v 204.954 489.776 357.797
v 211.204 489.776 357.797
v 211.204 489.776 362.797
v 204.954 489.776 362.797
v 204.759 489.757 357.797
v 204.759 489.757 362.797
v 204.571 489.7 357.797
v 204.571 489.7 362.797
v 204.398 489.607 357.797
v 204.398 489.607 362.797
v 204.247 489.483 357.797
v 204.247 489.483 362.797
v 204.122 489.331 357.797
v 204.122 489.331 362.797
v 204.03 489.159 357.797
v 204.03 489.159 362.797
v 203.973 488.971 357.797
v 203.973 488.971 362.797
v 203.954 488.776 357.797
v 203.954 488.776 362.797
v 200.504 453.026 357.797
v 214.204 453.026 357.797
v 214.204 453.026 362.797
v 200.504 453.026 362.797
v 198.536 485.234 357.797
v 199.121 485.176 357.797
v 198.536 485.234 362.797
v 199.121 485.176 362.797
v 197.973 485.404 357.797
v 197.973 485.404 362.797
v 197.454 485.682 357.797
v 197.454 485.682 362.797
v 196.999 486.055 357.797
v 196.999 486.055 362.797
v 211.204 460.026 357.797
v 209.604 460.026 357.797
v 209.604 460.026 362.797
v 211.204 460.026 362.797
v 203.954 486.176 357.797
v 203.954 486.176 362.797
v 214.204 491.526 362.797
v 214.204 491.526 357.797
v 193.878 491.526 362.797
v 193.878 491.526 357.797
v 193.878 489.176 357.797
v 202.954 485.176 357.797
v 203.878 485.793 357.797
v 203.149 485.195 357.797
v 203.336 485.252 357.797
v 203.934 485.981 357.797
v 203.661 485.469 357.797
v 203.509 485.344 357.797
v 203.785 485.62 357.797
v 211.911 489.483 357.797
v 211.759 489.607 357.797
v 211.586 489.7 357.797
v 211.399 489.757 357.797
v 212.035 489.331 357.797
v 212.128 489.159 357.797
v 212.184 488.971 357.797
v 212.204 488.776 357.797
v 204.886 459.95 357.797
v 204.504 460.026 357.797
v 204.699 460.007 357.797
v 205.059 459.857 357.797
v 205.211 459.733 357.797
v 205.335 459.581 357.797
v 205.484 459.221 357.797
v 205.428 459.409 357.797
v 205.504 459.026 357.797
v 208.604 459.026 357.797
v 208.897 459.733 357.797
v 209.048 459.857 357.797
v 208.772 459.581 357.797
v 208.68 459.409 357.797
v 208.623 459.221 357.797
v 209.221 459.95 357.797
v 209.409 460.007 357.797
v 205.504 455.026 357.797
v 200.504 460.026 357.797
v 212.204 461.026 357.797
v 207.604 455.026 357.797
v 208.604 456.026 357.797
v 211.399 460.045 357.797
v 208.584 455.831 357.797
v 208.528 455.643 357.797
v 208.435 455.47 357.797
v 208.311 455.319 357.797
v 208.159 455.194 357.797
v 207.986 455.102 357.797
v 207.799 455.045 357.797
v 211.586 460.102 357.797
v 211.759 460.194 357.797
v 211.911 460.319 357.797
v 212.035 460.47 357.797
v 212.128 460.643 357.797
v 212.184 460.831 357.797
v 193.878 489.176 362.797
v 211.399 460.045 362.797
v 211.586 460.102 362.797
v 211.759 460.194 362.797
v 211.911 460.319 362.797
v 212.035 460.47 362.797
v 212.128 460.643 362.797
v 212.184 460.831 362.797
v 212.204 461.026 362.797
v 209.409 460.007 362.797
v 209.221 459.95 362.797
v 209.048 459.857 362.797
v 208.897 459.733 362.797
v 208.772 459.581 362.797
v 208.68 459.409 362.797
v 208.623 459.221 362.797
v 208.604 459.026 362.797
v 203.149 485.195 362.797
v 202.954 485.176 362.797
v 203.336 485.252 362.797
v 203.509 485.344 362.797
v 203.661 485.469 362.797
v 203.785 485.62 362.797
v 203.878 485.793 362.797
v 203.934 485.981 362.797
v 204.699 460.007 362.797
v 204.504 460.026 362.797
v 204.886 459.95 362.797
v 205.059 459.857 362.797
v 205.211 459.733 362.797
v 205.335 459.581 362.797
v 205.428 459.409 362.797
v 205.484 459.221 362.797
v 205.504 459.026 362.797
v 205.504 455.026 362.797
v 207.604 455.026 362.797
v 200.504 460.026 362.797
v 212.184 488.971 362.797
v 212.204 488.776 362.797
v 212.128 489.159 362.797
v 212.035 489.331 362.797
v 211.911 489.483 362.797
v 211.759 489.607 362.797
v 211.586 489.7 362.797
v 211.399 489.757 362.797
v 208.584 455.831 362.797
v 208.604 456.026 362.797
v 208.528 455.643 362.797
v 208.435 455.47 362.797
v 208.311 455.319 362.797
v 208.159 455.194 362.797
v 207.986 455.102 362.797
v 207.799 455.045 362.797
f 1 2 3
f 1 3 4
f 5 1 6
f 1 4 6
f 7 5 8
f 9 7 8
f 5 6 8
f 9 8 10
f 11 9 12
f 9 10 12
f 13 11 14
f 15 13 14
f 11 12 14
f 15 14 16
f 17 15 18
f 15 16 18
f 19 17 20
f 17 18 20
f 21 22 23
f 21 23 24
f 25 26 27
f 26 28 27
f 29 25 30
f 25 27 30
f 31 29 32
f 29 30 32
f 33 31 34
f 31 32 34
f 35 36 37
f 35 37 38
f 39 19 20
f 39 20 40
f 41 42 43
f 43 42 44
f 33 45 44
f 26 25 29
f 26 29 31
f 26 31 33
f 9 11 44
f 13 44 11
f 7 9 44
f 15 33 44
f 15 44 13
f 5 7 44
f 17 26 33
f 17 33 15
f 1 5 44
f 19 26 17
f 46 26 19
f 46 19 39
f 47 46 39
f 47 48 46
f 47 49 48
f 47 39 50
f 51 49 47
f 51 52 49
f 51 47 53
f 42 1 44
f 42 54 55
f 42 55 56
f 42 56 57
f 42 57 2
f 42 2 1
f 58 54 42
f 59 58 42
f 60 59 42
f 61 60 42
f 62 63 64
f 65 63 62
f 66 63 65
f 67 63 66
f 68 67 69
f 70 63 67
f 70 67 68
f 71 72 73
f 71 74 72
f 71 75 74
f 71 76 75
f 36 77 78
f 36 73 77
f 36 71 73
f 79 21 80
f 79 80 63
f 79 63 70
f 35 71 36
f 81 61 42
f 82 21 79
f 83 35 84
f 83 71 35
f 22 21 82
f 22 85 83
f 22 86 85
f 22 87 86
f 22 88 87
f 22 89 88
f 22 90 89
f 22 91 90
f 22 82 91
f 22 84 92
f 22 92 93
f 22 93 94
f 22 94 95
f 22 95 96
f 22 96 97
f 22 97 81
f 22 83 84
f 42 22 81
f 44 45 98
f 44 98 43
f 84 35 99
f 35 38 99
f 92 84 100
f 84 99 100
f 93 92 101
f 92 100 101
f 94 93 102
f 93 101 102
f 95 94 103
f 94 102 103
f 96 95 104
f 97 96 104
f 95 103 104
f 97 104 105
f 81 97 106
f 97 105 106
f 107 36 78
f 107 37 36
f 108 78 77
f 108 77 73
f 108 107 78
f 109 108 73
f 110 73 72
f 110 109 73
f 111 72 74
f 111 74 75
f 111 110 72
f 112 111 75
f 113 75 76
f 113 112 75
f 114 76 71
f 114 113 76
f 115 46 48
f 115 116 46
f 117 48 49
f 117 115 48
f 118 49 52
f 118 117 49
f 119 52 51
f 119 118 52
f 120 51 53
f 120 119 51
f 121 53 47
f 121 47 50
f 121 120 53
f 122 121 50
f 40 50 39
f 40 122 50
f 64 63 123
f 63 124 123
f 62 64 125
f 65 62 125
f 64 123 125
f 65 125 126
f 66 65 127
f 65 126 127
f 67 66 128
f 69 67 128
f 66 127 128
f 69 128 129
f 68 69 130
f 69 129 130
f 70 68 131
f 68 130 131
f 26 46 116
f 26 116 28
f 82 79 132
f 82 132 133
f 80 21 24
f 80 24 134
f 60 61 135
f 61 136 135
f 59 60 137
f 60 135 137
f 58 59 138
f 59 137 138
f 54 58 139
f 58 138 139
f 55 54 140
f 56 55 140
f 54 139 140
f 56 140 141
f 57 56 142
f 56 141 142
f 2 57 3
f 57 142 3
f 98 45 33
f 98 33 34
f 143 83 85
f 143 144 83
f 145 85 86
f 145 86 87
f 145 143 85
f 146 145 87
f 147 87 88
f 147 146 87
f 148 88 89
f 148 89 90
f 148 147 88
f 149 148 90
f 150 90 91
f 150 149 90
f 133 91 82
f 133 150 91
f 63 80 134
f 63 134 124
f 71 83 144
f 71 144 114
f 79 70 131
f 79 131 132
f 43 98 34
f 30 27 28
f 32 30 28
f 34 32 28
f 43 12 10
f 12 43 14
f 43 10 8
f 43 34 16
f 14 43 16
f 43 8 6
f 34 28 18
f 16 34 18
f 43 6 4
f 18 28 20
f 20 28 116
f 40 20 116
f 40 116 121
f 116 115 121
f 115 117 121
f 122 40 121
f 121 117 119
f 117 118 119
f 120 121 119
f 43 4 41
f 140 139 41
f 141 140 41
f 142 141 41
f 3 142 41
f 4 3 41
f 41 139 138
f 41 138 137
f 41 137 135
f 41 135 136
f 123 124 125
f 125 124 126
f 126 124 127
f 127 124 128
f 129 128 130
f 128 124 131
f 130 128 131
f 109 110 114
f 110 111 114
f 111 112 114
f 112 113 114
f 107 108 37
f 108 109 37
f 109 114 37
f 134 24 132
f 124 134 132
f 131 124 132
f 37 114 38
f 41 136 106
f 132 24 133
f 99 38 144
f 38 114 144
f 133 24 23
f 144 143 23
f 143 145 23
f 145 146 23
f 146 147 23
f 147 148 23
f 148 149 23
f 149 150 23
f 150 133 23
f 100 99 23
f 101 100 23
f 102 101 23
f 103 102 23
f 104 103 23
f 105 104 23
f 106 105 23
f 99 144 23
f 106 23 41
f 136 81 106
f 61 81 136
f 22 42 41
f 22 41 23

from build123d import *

# Parameters (mm, degrees)
PAD_DEPTH    = 5
FILLET_R     = 1
FILLET001_R  = 1
CHAMFER_SIZE = 4
FILLET002_R  = 3
FILLET003_R  = 1


with BuildPart() as part:
    # Sketch (on CopyPart__Feature) → Pad (new body)
    with BuildSketch(Plane(origin=(211.803644, 488.825915, 357.796851), x_dir=(-1, 0, 0), z_dir=(0, 0, 1))):
        Polygon((3.2, 28.8), (-0.4, 28.8), (-0.4, -0.95), (7.85, -0.95), (7.85, 3.65), (17.92547, 3.65), (17.92547, -2.7), (7.85, -2.7), (-2.4, -2.7), (-2.4, 35.8), (11.3, 35.8), (11.3, 28.8), (6.3, 28.8), (6.3, 33.8), (3.2, 33.8), align=None)
    extrude(amount=PAD_DEPTH)

    # Fillet
    fillet_edges = [part.edges().sort_by_distance(p)[0] for p in [
        (203.953644, 489.775915, 360.296851),
        (212.203644, 489.775915, 360.296851),
        (212.203644, 460.025915, 360.296851),
        (205.503644, 460.025915, 360.296851),
    ]]
    fillet(fillet_edges, radius=FILLET_R)

    # Fillet001
    fillet001_edges = [part.edges().sort_by_distance(p)[0] for p in [
        (208.603644, 460.025915, 360.296851),
        (208.603644, 455.025915, 360.296851),
    ]]
    fillet(fillet001_edges, radius=FILLET001_R)

    # Chamfer
    chamfer_edges = [part.edges().sort_by_distance(p)[0] for p in [
        (193.878174, 485.175915, 360.296851),
    ]]
    chamfer(chamfer_edges, length=CHAMFER_SIZE)

    # Fillet002
    fillet002_edges = [part.edges().sort_by_distance(p)[0] for p in [
        (197.878174, 485.175915, 360.296851),
    ]]
    fillet(fillet002_edges, radius=FILLET002_R)

    # Fillet003
    fillet003_edges = [part.edges().sort_by_distance(p)[0] for p in [
        (203.953644, 485.175915, 360.296851),
    ]]
    fillet(fillet003_edges, radius=FILLET003_R)


solid = part.part
